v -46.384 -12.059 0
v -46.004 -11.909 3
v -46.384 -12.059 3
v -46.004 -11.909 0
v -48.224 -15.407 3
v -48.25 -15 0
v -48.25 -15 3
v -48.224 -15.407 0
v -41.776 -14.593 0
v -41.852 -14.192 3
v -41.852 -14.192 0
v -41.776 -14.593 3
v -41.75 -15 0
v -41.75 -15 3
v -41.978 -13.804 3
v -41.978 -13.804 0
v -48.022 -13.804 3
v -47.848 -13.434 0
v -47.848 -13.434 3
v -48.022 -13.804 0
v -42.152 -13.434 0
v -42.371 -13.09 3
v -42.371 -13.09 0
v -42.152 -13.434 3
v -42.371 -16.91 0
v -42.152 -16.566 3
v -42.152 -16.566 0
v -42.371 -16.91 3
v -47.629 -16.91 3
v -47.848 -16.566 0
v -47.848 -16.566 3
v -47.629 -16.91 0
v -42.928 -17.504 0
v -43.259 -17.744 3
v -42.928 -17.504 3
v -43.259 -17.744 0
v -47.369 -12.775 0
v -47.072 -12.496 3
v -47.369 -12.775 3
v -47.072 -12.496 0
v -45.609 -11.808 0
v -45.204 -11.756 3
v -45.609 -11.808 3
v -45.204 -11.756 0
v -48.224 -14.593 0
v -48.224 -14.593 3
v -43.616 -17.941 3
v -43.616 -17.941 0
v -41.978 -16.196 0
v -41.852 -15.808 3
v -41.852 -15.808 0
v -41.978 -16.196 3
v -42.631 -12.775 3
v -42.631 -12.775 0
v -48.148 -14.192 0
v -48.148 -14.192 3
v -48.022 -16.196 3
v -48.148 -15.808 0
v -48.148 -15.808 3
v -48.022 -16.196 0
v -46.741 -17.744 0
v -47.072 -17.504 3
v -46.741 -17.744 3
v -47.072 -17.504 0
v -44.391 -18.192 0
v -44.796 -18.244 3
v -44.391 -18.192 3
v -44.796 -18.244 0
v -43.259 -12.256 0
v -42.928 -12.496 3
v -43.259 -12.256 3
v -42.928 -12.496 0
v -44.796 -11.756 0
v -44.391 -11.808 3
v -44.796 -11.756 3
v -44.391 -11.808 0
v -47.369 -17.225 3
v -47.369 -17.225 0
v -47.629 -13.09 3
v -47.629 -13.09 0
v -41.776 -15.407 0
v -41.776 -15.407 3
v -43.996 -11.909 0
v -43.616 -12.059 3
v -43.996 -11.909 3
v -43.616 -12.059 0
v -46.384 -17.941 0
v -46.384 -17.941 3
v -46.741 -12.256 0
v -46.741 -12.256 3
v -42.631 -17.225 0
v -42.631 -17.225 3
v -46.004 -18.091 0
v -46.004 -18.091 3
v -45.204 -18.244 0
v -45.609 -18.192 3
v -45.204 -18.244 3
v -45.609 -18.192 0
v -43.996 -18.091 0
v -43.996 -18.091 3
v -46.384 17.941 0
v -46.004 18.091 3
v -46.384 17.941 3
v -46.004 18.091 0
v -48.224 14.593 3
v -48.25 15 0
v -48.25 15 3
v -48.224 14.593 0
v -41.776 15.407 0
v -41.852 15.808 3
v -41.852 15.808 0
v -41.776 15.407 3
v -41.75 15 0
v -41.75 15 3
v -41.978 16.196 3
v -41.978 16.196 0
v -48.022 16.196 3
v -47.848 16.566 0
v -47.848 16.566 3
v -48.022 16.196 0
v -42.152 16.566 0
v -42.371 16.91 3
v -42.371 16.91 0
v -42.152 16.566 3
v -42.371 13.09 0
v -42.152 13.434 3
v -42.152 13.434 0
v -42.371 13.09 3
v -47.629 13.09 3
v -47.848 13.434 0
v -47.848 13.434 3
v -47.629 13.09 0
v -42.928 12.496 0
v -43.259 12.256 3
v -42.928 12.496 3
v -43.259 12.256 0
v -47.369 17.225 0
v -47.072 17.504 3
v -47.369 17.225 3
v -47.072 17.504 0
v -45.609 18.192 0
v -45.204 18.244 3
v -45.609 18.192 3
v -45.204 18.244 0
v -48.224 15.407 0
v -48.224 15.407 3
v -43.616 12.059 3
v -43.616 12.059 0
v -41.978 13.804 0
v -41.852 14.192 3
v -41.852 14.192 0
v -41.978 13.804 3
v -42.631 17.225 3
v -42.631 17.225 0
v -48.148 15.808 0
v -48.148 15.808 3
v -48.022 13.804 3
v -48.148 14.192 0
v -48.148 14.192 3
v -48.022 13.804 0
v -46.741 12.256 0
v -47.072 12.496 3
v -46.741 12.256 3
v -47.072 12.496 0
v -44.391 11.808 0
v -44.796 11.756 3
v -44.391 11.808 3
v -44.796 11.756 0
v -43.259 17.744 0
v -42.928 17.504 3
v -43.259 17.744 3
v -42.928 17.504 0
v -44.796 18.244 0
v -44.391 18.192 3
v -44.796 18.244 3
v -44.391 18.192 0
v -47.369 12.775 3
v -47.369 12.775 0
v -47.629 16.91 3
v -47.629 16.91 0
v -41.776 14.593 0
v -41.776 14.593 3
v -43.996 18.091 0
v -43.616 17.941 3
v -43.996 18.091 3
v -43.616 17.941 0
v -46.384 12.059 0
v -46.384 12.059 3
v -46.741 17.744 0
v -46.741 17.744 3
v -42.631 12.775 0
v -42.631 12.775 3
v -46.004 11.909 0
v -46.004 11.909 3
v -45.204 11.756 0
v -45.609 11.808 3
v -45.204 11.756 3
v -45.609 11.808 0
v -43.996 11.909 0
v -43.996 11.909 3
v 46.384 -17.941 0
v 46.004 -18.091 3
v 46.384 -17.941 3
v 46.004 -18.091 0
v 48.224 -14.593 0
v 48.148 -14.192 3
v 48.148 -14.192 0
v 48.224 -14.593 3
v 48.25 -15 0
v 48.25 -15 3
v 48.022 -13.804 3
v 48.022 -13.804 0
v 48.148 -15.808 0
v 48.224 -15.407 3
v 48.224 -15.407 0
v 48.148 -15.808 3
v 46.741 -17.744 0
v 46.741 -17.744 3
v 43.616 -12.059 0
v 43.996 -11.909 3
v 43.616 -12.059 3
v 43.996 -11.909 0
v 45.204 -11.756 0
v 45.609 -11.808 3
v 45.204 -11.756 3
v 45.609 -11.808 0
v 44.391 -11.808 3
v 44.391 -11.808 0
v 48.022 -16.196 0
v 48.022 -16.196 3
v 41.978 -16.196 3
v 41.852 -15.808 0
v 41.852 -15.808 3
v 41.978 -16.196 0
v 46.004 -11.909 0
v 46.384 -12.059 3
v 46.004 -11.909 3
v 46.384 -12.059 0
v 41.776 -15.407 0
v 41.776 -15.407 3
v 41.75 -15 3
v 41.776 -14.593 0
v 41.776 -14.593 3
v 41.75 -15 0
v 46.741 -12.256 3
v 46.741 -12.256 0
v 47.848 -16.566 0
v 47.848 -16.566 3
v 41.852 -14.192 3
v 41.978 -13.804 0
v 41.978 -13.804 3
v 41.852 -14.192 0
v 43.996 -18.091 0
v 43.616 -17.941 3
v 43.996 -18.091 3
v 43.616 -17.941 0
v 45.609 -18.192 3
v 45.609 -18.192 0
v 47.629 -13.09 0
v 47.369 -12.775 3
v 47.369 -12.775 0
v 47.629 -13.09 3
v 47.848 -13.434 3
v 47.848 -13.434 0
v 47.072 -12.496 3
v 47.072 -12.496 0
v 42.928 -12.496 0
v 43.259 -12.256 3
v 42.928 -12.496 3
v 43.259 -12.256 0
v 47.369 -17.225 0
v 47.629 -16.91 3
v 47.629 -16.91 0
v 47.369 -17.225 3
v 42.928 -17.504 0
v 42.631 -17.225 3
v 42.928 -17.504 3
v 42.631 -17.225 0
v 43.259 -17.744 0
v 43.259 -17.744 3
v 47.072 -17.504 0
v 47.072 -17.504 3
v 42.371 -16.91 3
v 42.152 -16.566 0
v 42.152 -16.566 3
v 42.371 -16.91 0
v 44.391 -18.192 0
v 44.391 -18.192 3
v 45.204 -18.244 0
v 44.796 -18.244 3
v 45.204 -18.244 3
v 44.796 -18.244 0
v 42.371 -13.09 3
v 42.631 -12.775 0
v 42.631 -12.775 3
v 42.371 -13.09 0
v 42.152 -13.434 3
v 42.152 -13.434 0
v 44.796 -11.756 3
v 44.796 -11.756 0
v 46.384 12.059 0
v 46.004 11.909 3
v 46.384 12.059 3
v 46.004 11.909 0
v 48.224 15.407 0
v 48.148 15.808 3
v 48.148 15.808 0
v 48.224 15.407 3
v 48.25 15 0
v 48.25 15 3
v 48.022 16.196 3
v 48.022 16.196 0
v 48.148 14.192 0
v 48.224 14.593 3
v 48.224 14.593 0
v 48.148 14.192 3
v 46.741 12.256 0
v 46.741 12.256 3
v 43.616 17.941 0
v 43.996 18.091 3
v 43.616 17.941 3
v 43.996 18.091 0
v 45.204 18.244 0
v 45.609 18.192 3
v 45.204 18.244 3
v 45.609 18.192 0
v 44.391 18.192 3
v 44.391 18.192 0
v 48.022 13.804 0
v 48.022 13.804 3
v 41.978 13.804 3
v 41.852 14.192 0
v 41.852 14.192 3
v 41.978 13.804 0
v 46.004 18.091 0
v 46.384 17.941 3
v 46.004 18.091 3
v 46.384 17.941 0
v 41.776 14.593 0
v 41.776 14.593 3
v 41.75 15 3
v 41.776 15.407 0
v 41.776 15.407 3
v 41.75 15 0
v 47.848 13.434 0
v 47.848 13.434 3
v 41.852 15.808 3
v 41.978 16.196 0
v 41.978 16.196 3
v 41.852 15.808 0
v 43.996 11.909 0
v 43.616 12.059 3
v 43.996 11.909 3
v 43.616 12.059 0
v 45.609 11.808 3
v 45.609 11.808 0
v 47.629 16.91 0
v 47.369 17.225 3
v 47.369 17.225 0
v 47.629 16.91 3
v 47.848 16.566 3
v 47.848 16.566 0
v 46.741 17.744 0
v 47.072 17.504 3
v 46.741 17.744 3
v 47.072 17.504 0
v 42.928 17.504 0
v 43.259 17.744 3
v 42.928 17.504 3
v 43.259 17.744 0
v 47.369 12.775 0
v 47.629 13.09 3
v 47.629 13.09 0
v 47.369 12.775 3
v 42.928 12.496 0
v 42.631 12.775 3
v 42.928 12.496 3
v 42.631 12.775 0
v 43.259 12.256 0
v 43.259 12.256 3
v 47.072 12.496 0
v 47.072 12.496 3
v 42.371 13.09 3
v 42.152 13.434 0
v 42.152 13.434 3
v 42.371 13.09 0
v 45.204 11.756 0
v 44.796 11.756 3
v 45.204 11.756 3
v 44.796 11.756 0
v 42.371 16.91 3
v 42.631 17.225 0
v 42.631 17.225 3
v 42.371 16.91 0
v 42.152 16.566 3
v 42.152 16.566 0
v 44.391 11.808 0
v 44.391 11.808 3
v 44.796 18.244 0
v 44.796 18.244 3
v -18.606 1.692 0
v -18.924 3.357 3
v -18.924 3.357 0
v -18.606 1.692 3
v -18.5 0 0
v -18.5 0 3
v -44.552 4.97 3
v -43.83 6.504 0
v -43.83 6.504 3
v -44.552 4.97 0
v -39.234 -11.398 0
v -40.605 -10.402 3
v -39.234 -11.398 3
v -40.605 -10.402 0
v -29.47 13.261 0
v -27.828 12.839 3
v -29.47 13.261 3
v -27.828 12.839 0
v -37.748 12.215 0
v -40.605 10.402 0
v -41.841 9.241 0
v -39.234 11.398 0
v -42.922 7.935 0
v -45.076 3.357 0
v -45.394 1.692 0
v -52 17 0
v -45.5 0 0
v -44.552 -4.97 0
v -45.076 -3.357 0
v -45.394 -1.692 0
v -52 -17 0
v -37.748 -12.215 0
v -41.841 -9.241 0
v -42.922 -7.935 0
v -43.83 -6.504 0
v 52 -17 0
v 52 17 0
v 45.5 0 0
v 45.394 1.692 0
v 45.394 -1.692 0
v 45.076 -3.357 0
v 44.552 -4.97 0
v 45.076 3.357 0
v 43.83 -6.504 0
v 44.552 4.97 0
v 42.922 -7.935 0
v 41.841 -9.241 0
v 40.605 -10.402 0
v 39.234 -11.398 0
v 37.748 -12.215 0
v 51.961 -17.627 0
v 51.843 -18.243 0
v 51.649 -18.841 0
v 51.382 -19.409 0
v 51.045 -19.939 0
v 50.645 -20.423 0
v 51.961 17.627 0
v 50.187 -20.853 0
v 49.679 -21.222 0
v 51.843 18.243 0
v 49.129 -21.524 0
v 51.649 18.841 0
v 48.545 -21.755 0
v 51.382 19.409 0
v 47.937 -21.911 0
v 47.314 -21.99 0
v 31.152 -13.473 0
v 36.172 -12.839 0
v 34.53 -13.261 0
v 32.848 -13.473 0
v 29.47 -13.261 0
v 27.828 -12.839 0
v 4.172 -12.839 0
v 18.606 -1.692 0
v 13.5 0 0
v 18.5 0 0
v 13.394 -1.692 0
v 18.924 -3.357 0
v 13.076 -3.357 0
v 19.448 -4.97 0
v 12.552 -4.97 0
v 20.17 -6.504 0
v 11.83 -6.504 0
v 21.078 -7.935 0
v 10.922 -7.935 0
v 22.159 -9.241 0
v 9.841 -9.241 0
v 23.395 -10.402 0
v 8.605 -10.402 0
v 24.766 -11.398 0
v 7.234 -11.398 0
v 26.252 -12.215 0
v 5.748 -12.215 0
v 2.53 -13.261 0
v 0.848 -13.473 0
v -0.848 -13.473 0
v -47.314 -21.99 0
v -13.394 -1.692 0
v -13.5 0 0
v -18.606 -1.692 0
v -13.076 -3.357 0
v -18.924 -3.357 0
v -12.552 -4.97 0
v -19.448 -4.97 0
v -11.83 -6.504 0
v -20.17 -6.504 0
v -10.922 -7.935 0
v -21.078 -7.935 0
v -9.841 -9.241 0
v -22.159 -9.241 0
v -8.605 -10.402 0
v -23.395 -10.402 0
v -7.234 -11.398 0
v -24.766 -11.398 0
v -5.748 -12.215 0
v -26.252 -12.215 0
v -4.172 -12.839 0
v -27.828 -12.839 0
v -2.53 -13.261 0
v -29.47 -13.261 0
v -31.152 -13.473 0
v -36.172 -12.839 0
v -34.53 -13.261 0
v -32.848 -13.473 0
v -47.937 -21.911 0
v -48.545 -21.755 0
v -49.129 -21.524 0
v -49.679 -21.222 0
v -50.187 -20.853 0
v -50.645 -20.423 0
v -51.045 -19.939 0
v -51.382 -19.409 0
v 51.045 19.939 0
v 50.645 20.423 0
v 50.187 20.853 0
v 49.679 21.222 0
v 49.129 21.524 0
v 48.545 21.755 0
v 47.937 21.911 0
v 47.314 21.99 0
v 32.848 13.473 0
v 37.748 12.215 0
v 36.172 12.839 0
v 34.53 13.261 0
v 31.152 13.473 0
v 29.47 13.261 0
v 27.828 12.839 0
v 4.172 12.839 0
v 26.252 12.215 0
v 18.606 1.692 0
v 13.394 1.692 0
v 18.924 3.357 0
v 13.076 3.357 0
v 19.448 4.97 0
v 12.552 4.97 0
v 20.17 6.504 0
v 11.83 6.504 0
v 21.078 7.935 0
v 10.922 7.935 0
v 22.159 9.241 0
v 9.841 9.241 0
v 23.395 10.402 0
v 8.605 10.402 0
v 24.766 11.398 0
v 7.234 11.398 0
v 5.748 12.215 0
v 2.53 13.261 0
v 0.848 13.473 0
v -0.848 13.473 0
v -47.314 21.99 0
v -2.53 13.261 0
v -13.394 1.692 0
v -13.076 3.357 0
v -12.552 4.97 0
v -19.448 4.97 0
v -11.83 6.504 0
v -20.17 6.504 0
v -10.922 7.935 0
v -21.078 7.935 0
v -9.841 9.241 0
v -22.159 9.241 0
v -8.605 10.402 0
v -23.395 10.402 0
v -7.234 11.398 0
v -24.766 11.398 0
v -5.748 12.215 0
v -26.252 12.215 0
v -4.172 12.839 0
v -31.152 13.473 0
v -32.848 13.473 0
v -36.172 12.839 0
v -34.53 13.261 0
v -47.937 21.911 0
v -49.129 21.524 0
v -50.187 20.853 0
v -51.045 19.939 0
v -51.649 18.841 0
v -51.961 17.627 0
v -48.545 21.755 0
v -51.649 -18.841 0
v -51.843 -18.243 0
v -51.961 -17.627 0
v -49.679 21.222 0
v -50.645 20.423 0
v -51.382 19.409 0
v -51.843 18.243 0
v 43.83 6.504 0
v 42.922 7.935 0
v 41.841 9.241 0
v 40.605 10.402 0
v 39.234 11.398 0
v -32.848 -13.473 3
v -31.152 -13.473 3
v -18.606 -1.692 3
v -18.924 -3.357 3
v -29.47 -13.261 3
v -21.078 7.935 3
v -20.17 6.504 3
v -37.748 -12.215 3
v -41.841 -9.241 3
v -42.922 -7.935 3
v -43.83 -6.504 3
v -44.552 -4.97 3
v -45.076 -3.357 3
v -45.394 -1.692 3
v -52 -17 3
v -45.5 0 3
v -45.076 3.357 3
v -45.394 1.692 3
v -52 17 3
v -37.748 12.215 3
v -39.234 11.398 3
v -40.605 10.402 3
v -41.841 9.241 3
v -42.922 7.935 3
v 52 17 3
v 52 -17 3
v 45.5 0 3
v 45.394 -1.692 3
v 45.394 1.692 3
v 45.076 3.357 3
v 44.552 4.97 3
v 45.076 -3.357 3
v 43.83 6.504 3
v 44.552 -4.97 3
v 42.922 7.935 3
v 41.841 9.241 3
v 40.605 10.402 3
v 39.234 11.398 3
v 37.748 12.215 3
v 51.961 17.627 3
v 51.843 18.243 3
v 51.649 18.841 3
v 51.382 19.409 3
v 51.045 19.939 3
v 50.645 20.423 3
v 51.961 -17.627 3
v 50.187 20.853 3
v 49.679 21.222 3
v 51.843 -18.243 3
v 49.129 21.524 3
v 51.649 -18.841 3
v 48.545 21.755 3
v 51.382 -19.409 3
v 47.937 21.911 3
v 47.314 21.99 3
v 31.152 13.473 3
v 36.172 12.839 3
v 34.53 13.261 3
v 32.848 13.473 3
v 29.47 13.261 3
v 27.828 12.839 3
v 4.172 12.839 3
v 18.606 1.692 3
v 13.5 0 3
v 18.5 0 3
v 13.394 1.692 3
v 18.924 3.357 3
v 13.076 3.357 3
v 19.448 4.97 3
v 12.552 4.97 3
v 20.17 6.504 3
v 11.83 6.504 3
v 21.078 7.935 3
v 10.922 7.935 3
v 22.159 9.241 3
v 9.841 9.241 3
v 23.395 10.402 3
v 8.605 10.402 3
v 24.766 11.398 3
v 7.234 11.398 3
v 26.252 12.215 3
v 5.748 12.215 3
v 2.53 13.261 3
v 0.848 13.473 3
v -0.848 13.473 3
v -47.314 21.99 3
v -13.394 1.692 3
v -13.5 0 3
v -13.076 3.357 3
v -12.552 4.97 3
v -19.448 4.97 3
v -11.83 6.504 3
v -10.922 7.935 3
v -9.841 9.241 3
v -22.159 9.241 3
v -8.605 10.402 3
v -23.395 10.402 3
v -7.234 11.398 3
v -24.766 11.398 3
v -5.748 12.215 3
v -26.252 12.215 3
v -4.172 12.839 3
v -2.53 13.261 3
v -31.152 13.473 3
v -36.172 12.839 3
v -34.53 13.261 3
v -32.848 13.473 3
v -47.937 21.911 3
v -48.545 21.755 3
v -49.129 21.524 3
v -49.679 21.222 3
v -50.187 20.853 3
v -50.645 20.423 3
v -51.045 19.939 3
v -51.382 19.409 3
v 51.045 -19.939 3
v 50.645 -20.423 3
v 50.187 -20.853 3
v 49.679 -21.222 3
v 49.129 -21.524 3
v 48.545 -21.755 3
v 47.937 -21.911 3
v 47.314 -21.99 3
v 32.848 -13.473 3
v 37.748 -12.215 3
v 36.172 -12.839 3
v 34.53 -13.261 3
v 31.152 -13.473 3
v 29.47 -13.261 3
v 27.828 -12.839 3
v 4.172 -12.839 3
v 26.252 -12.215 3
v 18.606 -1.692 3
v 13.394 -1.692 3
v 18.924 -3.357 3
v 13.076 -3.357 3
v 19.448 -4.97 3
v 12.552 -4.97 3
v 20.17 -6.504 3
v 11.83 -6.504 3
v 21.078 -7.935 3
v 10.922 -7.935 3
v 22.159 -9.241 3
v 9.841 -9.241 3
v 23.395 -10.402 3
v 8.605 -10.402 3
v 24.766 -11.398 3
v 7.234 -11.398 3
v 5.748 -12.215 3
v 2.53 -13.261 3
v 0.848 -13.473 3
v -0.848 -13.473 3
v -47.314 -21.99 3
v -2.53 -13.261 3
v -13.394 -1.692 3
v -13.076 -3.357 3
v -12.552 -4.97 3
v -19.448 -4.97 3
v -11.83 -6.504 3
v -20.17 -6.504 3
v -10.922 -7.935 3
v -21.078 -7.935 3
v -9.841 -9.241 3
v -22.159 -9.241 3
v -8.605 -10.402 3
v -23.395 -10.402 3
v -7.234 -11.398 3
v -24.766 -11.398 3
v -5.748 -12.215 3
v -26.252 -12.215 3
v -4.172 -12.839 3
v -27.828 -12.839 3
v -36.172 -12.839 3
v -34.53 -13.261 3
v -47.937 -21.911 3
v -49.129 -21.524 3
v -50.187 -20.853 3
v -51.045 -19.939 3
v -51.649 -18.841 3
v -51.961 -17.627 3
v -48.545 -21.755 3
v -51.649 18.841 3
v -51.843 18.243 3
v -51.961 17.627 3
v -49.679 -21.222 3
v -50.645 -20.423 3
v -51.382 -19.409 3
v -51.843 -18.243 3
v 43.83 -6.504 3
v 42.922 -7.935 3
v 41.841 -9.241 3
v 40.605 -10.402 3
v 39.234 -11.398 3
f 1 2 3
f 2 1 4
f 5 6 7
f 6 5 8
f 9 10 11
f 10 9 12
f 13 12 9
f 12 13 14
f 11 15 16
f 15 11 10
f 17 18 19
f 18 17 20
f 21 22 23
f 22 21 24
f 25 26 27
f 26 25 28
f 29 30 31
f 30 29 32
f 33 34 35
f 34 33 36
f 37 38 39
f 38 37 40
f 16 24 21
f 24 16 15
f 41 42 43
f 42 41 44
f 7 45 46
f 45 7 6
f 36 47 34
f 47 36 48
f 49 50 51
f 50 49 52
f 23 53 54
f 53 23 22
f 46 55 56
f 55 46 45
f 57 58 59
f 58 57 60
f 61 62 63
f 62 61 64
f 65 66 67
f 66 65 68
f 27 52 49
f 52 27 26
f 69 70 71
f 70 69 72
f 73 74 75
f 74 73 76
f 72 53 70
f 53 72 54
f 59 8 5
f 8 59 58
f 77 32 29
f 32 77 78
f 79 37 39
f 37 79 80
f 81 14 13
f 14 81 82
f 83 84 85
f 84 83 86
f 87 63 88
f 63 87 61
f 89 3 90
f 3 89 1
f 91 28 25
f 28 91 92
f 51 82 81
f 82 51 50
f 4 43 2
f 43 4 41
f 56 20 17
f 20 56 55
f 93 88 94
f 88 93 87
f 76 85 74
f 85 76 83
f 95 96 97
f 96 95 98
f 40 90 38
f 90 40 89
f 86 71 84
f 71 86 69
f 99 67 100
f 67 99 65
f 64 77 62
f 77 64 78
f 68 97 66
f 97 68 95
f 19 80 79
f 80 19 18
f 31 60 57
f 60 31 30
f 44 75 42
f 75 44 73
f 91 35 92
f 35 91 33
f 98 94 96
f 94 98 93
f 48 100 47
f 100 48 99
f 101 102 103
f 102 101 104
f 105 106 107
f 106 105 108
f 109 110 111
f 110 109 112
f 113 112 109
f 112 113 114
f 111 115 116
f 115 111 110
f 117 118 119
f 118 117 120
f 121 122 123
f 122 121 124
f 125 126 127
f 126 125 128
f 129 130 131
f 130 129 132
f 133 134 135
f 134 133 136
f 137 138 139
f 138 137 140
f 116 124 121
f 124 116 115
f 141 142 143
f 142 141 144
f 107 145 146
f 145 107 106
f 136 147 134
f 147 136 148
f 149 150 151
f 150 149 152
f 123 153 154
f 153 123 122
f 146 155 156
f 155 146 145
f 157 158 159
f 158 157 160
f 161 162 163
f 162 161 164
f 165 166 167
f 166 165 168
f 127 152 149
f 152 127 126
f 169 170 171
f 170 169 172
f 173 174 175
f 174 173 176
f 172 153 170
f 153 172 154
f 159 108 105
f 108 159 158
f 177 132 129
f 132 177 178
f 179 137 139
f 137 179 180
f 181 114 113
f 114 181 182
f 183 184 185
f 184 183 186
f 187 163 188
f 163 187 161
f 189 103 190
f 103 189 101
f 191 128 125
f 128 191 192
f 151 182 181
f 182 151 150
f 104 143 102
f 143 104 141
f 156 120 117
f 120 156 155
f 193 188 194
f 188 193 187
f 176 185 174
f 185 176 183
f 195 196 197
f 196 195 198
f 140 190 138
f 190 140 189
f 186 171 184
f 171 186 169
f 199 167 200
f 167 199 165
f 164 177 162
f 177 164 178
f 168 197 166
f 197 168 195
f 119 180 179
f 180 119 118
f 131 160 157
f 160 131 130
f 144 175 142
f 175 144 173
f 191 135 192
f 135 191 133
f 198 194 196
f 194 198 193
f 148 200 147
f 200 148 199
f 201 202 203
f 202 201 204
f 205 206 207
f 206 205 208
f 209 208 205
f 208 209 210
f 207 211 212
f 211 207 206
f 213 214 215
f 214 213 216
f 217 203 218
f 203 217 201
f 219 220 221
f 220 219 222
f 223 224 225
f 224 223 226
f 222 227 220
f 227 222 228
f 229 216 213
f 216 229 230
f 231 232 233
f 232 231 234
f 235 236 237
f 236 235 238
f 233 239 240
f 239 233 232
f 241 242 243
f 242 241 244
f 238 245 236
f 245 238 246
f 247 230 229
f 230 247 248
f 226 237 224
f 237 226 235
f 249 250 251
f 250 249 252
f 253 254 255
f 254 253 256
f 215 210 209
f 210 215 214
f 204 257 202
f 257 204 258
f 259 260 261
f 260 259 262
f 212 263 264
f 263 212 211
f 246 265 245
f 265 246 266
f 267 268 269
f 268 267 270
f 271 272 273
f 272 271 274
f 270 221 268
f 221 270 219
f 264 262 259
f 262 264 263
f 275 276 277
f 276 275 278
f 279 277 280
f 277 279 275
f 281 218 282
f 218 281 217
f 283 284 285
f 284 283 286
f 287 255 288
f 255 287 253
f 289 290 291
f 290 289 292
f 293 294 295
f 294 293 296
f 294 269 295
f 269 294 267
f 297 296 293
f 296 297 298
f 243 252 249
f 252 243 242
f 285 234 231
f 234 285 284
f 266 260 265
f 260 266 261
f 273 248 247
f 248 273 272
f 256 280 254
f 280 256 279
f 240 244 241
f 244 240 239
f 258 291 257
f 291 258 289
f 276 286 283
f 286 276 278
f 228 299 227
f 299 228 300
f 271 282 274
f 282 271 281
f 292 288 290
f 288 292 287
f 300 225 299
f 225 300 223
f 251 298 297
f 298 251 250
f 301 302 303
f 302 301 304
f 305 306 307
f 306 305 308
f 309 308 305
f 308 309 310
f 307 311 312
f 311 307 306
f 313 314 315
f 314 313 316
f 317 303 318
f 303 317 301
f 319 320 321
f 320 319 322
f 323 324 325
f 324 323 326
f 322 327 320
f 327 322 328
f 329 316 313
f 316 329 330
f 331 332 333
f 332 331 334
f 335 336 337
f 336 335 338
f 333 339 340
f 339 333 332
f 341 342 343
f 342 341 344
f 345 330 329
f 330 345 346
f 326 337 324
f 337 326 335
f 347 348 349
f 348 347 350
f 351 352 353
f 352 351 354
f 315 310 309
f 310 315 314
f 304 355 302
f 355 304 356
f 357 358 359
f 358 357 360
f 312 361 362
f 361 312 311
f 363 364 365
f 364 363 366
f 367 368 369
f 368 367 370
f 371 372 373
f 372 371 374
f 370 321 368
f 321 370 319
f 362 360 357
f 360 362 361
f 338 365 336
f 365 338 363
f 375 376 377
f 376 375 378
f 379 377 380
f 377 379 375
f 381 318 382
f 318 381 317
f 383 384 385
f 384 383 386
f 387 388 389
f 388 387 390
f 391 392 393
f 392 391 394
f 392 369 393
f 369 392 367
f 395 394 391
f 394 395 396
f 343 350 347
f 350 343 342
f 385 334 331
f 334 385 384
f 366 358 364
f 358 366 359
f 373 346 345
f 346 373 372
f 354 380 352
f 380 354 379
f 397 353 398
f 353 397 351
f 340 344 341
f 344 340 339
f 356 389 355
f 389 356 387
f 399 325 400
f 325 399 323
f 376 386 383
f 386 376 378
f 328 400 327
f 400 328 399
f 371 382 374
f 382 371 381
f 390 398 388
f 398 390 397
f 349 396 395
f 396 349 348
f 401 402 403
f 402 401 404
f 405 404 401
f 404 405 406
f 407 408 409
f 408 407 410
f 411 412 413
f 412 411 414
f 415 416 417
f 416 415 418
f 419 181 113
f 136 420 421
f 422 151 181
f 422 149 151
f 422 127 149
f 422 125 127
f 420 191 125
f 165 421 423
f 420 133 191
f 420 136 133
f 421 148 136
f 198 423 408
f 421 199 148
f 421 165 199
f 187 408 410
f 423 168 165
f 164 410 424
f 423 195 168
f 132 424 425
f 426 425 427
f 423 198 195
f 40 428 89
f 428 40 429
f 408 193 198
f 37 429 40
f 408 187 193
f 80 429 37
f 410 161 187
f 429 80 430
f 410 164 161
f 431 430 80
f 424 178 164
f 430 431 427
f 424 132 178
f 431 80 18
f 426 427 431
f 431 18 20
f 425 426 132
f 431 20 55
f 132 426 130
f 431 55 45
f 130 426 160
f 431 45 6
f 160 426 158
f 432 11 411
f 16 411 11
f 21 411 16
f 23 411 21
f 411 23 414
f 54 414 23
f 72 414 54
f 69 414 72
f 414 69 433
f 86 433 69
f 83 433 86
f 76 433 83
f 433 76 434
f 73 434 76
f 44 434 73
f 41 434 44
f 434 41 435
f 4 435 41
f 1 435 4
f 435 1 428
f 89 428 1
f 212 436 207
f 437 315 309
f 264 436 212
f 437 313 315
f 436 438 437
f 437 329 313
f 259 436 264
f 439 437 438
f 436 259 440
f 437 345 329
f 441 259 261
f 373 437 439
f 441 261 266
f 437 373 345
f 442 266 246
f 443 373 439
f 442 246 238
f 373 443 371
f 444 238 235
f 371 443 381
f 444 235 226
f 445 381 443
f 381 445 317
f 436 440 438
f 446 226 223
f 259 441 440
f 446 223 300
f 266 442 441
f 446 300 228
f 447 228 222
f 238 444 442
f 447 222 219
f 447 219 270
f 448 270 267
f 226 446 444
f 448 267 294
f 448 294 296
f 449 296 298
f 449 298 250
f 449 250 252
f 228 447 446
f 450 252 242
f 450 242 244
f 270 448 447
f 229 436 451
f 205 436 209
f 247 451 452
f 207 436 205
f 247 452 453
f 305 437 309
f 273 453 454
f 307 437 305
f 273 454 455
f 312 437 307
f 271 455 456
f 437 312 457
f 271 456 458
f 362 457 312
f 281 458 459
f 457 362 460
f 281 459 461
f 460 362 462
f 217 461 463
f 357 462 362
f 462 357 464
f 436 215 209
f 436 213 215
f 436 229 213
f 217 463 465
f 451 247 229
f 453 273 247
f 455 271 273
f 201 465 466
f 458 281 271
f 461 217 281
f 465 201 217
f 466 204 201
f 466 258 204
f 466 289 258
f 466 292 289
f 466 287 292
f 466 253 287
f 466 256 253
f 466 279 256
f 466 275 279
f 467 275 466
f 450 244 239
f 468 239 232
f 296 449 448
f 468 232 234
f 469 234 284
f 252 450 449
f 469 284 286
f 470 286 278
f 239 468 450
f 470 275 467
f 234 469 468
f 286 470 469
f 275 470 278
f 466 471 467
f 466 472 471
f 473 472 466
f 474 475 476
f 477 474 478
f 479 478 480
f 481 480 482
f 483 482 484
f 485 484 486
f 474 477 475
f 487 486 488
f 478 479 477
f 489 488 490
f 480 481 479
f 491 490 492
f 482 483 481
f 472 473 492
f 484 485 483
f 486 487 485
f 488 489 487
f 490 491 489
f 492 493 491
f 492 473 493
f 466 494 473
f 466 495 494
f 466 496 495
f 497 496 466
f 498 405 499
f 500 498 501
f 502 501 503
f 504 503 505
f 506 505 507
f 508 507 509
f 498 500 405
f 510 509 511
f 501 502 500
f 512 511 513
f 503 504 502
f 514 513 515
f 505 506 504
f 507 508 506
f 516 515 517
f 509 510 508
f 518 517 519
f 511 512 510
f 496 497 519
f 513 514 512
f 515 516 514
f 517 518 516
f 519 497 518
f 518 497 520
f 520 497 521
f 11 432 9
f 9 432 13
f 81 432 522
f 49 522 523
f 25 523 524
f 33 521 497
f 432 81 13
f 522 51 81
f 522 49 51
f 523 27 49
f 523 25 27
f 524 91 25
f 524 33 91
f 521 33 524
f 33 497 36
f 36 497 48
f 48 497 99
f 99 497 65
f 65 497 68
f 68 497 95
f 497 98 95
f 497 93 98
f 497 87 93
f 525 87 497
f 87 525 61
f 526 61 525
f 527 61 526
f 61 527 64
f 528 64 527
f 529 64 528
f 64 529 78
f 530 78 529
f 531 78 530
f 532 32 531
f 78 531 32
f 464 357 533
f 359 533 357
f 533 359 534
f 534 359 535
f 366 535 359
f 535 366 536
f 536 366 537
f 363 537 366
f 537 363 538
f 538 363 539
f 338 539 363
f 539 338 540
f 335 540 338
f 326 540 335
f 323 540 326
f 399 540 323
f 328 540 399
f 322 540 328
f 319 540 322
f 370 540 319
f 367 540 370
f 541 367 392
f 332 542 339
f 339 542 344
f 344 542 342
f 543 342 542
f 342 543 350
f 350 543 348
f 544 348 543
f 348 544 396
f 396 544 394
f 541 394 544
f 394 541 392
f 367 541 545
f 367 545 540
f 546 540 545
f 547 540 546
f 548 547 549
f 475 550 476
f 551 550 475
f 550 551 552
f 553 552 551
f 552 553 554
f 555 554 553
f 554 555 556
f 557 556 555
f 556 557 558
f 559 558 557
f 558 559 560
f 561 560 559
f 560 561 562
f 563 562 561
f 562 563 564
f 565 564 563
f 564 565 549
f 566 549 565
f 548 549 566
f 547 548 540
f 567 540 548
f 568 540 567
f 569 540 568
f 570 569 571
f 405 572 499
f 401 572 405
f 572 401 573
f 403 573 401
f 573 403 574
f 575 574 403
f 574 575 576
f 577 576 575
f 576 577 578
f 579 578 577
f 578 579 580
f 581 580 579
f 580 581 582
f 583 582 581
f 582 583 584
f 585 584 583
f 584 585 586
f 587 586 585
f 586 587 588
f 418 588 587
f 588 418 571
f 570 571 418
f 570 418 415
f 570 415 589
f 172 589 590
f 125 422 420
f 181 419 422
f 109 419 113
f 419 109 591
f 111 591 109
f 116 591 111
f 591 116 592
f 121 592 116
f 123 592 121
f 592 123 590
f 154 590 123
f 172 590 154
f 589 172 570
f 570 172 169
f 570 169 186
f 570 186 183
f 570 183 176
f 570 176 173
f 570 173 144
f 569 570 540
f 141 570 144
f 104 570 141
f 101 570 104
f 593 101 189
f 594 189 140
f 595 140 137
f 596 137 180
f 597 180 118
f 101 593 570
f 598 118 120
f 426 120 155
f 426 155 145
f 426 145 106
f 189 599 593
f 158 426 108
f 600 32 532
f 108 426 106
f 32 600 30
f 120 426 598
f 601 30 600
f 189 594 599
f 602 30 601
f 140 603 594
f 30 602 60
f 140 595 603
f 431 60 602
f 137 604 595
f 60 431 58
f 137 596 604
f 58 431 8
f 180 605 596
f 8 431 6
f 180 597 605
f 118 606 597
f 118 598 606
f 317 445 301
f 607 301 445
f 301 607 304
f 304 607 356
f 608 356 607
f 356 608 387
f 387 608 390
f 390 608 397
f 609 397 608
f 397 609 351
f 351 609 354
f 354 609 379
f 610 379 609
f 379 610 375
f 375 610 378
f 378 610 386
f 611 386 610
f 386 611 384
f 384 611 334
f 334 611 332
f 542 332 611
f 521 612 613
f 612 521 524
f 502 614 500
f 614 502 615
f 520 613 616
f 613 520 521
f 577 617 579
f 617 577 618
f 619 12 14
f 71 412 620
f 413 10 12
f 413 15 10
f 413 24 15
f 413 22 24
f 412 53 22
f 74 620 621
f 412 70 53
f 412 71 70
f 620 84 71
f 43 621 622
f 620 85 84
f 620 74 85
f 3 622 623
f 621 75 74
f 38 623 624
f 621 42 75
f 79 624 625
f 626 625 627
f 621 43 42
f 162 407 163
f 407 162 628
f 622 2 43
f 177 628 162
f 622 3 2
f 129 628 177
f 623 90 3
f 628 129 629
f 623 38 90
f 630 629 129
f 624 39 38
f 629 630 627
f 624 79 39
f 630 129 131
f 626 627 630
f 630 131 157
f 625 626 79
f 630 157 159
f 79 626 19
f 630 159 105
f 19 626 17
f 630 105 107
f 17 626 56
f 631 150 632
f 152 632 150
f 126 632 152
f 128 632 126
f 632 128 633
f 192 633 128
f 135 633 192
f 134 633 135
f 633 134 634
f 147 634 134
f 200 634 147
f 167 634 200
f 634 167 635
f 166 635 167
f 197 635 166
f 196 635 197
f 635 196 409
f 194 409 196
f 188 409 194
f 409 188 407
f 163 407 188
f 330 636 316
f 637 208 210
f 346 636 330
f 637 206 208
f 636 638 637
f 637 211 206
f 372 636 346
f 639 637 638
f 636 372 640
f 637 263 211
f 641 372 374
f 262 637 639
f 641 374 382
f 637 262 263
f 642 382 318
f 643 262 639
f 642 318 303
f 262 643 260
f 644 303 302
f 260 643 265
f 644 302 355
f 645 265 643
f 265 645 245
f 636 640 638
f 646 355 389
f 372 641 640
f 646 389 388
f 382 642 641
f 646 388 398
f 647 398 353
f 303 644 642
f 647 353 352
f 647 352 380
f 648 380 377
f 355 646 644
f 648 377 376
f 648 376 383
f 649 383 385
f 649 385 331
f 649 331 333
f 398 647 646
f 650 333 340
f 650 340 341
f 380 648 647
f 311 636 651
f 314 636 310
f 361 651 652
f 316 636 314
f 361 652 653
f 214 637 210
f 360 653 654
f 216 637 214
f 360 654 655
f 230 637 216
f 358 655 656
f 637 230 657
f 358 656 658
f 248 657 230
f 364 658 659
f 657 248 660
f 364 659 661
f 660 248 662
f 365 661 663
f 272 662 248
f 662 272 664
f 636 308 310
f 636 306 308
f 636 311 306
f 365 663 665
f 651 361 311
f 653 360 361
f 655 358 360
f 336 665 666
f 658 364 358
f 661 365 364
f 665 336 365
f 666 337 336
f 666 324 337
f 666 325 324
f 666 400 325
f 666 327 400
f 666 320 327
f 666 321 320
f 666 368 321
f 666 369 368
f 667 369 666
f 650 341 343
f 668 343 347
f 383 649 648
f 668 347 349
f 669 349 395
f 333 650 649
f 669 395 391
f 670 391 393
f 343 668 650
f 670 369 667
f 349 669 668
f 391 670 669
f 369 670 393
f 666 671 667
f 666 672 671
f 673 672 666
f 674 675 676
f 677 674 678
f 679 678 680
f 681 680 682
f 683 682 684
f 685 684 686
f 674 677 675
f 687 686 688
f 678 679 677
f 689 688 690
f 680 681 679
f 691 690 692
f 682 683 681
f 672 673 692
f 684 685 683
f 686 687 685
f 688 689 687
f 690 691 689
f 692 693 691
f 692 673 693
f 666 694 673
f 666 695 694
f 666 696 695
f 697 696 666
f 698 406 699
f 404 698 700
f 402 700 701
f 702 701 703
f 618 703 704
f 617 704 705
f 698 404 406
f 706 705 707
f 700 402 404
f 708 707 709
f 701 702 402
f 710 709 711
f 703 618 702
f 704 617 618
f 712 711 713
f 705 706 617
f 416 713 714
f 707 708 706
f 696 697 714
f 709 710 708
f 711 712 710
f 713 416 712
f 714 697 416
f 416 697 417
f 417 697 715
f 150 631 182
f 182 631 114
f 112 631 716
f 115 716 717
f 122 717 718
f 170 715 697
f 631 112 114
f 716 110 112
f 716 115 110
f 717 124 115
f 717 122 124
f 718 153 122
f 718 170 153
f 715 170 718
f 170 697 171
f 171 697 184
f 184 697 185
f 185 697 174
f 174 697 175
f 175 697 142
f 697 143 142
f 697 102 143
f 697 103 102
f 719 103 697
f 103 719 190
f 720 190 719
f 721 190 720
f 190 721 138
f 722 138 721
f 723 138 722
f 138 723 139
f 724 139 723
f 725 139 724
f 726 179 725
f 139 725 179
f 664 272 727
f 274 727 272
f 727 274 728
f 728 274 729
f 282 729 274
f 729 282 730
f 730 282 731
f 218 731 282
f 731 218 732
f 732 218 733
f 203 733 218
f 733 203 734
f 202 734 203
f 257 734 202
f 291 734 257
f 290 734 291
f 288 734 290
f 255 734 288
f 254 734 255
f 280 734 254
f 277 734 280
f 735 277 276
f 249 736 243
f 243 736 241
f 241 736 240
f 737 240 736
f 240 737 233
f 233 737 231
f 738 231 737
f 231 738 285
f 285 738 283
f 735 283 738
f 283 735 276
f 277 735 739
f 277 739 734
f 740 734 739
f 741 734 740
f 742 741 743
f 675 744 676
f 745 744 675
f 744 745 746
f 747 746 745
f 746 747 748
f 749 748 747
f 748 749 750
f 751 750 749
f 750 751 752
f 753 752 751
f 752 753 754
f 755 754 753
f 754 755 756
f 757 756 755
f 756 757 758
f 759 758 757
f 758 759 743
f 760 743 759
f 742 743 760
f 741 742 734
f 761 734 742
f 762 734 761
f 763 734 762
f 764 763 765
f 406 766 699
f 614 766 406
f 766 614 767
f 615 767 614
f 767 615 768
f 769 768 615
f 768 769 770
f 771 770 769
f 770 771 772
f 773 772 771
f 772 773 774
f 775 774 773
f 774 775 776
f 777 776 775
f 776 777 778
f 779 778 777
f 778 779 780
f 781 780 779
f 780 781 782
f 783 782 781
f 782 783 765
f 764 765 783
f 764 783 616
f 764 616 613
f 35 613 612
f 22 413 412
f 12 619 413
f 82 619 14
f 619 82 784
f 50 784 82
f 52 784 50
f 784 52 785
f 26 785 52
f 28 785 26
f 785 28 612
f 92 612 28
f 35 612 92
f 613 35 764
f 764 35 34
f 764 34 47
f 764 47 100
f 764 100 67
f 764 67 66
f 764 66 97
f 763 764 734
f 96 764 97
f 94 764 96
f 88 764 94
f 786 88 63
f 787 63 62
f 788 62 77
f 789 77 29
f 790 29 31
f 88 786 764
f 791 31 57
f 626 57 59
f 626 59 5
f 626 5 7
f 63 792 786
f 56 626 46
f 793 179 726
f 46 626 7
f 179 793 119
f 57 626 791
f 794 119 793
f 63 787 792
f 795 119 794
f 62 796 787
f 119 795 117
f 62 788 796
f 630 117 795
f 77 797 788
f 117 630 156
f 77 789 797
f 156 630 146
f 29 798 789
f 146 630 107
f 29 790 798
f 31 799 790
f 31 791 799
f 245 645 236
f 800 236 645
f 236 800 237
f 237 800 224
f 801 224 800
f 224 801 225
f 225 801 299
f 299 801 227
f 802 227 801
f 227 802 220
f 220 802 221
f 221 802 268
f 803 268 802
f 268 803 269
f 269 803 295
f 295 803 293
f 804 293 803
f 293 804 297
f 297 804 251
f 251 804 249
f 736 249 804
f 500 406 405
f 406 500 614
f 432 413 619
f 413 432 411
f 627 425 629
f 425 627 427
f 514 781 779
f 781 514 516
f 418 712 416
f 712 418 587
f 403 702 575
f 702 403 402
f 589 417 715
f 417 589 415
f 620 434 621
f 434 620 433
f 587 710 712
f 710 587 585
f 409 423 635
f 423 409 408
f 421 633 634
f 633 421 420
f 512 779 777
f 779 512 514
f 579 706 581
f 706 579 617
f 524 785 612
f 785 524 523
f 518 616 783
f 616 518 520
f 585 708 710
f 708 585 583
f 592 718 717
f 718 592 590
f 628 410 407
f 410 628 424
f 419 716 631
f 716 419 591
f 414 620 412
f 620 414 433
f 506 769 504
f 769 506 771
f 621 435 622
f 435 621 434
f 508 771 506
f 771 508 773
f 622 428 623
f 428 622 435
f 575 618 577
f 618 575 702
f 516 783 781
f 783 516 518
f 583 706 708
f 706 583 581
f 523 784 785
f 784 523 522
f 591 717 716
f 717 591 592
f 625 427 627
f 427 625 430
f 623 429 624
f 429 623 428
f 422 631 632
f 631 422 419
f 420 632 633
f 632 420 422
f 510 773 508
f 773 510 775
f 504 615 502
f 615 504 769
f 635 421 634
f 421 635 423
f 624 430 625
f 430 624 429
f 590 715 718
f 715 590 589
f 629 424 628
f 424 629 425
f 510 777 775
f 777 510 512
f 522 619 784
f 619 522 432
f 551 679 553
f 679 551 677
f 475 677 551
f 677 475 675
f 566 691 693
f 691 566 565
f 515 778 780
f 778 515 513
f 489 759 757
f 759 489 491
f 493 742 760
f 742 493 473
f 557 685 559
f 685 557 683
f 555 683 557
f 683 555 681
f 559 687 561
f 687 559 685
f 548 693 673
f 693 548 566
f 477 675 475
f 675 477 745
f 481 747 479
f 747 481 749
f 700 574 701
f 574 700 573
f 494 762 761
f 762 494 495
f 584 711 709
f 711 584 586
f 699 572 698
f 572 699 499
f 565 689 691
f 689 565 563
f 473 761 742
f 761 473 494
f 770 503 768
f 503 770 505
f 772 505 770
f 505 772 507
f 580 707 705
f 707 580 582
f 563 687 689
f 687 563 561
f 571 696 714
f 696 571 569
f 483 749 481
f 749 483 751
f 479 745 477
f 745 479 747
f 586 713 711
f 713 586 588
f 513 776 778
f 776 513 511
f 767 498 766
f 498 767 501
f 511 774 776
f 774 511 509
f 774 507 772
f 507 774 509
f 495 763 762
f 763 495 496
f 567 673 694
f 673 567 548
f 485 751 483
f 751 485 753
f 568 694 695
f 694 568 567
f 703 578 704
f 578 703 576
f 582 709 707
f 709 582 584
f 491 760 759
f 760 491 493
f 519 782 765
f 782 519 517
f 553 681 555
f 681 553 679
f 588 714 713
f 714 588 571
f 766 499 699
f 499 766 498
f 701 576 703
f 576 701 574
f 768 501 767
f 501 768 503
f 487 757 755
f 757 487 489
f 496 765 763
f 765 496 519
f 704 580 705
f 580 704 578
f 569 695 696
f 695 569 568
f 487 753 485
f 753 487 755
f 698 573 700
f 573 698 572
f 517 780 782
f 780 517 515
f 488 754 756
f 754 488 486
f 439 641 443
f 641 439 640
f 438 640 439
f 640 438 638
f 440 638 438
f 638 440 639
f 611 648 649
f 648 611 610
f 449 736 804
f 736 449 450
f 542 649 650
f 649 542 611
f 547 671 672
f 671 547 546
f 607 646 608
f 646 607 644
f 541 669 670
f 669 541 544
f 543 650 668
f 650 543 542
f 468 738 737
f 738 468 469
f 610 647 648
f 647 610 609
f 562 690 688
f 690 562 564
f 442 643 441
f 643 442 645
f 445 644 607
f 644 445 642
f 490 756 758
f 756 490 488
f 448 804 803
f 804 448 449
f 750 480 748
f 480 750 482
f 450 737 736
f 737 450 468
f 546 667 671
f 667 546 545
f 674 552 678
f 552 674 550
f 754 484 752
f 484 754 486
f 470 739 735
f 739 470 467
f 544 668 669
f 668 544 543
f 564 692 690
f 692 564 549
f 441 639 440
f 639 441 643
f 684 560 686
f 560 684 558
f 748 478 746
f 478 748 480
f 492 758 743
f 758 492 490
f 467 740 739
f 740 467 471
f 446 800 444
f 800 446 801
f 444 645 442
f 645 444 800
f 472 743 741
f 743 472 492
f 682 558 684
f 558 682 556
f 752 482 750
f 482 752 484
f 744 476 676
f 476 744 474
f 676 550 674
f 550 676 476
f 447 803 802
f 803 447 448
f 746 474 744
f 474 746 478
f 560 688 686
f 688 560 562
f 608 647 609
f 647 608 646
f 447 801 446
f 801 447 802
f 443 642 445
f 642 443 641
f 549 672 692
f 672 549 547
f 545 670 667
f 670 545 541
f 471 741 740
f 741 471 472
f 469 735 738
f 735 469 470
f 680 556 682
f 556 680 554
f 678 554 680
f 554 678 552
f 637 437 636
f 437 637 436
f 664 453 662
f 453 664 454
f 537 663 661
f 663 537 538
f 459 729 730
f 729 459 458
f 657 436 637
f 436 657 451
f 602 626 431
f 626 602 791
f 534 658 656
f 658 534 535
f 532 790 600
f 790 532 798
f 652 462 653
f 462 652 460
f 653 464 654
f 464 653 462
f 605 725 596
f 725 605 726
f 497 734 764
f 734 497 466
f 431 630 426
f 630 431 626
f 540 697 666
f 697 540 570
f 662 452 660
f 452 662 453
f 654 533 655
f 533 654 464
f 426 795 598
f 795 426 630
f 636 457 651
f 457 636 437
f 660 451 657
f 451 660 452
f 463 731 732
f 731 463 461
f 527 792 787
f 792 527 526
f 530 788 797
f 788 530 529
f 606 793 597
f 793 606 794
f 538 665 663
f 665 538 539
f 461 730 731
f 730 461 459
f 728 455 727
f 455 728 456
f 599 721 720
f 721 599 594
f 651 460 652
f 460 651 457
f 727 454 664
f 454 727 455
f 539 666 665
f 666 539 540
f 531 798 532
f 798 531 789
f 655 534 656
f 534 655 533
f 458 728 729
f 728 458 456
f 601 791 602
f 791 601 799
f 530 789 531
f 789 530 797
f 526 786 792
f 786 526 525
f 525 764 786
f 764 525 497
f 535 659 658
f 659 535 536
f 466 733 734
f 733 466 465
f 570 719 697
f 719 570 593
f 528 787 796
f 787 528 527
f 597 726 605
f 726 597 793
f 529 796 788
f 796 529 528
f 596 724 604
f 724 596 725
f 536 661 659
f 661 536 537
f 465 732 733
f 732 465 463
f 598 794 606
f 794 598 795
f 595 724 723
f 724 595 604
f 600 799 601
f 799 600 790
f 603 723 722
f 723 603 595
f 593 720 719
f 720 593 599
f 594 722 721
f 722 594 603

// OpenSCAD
$fn = 50;


difference() {
	union() {
		hull() {
			translate(v = [-47.0000000000, 17.0000000000, 0]) {
				cylinder(h = 3, r = 5);
			}
			translate(v = [47.0000000000, 17.0000000000, 0]) {
				cylinder(h = 3, r = 5);
			}
			translate(v = [-47.0000000000, -17.0000000000, 0]) {
				cylinder(h = 3, r = 5);
			}
			translate(v = [47.0000000000, -17.0000000000, 0]) {
				cylinder(h = 3, r = 5);
			}
		}
	}
	union() {
		#translate(v = [-45.0000000000, -15.0000000000, -100.0000000000]) {
			cylinder(h = 200, r = 3.2500000000);
		}
		#translate(v = [-45.0000000000, 15.0000000000, -100.0000000000]) {
			cylinder(h = 200, r = 3.2500000000);
		}
		#translate(v = [45.0000000000, -15.0000000000, -100.0000000000]) {
			cylinder(h = 200, r = 3.2500000000);
		}
		#translate(v = [45.0000000000, 15.0000000000, -100.0000000000]) {
			cylinder(h = 200, r = 3.2500000000);
		}
		#translate(v = [-32.0000000000, 0, 0]) {
			cylinder(h = 3, r = 13.5000000000);
		}
		#cylinder(h = 3, r = 13.5000000000);
		#translate(v = [32.0000000000, 0, 0]) {
			cylinder(h = 3, r = 13.5000000000);
		}
	}
}
